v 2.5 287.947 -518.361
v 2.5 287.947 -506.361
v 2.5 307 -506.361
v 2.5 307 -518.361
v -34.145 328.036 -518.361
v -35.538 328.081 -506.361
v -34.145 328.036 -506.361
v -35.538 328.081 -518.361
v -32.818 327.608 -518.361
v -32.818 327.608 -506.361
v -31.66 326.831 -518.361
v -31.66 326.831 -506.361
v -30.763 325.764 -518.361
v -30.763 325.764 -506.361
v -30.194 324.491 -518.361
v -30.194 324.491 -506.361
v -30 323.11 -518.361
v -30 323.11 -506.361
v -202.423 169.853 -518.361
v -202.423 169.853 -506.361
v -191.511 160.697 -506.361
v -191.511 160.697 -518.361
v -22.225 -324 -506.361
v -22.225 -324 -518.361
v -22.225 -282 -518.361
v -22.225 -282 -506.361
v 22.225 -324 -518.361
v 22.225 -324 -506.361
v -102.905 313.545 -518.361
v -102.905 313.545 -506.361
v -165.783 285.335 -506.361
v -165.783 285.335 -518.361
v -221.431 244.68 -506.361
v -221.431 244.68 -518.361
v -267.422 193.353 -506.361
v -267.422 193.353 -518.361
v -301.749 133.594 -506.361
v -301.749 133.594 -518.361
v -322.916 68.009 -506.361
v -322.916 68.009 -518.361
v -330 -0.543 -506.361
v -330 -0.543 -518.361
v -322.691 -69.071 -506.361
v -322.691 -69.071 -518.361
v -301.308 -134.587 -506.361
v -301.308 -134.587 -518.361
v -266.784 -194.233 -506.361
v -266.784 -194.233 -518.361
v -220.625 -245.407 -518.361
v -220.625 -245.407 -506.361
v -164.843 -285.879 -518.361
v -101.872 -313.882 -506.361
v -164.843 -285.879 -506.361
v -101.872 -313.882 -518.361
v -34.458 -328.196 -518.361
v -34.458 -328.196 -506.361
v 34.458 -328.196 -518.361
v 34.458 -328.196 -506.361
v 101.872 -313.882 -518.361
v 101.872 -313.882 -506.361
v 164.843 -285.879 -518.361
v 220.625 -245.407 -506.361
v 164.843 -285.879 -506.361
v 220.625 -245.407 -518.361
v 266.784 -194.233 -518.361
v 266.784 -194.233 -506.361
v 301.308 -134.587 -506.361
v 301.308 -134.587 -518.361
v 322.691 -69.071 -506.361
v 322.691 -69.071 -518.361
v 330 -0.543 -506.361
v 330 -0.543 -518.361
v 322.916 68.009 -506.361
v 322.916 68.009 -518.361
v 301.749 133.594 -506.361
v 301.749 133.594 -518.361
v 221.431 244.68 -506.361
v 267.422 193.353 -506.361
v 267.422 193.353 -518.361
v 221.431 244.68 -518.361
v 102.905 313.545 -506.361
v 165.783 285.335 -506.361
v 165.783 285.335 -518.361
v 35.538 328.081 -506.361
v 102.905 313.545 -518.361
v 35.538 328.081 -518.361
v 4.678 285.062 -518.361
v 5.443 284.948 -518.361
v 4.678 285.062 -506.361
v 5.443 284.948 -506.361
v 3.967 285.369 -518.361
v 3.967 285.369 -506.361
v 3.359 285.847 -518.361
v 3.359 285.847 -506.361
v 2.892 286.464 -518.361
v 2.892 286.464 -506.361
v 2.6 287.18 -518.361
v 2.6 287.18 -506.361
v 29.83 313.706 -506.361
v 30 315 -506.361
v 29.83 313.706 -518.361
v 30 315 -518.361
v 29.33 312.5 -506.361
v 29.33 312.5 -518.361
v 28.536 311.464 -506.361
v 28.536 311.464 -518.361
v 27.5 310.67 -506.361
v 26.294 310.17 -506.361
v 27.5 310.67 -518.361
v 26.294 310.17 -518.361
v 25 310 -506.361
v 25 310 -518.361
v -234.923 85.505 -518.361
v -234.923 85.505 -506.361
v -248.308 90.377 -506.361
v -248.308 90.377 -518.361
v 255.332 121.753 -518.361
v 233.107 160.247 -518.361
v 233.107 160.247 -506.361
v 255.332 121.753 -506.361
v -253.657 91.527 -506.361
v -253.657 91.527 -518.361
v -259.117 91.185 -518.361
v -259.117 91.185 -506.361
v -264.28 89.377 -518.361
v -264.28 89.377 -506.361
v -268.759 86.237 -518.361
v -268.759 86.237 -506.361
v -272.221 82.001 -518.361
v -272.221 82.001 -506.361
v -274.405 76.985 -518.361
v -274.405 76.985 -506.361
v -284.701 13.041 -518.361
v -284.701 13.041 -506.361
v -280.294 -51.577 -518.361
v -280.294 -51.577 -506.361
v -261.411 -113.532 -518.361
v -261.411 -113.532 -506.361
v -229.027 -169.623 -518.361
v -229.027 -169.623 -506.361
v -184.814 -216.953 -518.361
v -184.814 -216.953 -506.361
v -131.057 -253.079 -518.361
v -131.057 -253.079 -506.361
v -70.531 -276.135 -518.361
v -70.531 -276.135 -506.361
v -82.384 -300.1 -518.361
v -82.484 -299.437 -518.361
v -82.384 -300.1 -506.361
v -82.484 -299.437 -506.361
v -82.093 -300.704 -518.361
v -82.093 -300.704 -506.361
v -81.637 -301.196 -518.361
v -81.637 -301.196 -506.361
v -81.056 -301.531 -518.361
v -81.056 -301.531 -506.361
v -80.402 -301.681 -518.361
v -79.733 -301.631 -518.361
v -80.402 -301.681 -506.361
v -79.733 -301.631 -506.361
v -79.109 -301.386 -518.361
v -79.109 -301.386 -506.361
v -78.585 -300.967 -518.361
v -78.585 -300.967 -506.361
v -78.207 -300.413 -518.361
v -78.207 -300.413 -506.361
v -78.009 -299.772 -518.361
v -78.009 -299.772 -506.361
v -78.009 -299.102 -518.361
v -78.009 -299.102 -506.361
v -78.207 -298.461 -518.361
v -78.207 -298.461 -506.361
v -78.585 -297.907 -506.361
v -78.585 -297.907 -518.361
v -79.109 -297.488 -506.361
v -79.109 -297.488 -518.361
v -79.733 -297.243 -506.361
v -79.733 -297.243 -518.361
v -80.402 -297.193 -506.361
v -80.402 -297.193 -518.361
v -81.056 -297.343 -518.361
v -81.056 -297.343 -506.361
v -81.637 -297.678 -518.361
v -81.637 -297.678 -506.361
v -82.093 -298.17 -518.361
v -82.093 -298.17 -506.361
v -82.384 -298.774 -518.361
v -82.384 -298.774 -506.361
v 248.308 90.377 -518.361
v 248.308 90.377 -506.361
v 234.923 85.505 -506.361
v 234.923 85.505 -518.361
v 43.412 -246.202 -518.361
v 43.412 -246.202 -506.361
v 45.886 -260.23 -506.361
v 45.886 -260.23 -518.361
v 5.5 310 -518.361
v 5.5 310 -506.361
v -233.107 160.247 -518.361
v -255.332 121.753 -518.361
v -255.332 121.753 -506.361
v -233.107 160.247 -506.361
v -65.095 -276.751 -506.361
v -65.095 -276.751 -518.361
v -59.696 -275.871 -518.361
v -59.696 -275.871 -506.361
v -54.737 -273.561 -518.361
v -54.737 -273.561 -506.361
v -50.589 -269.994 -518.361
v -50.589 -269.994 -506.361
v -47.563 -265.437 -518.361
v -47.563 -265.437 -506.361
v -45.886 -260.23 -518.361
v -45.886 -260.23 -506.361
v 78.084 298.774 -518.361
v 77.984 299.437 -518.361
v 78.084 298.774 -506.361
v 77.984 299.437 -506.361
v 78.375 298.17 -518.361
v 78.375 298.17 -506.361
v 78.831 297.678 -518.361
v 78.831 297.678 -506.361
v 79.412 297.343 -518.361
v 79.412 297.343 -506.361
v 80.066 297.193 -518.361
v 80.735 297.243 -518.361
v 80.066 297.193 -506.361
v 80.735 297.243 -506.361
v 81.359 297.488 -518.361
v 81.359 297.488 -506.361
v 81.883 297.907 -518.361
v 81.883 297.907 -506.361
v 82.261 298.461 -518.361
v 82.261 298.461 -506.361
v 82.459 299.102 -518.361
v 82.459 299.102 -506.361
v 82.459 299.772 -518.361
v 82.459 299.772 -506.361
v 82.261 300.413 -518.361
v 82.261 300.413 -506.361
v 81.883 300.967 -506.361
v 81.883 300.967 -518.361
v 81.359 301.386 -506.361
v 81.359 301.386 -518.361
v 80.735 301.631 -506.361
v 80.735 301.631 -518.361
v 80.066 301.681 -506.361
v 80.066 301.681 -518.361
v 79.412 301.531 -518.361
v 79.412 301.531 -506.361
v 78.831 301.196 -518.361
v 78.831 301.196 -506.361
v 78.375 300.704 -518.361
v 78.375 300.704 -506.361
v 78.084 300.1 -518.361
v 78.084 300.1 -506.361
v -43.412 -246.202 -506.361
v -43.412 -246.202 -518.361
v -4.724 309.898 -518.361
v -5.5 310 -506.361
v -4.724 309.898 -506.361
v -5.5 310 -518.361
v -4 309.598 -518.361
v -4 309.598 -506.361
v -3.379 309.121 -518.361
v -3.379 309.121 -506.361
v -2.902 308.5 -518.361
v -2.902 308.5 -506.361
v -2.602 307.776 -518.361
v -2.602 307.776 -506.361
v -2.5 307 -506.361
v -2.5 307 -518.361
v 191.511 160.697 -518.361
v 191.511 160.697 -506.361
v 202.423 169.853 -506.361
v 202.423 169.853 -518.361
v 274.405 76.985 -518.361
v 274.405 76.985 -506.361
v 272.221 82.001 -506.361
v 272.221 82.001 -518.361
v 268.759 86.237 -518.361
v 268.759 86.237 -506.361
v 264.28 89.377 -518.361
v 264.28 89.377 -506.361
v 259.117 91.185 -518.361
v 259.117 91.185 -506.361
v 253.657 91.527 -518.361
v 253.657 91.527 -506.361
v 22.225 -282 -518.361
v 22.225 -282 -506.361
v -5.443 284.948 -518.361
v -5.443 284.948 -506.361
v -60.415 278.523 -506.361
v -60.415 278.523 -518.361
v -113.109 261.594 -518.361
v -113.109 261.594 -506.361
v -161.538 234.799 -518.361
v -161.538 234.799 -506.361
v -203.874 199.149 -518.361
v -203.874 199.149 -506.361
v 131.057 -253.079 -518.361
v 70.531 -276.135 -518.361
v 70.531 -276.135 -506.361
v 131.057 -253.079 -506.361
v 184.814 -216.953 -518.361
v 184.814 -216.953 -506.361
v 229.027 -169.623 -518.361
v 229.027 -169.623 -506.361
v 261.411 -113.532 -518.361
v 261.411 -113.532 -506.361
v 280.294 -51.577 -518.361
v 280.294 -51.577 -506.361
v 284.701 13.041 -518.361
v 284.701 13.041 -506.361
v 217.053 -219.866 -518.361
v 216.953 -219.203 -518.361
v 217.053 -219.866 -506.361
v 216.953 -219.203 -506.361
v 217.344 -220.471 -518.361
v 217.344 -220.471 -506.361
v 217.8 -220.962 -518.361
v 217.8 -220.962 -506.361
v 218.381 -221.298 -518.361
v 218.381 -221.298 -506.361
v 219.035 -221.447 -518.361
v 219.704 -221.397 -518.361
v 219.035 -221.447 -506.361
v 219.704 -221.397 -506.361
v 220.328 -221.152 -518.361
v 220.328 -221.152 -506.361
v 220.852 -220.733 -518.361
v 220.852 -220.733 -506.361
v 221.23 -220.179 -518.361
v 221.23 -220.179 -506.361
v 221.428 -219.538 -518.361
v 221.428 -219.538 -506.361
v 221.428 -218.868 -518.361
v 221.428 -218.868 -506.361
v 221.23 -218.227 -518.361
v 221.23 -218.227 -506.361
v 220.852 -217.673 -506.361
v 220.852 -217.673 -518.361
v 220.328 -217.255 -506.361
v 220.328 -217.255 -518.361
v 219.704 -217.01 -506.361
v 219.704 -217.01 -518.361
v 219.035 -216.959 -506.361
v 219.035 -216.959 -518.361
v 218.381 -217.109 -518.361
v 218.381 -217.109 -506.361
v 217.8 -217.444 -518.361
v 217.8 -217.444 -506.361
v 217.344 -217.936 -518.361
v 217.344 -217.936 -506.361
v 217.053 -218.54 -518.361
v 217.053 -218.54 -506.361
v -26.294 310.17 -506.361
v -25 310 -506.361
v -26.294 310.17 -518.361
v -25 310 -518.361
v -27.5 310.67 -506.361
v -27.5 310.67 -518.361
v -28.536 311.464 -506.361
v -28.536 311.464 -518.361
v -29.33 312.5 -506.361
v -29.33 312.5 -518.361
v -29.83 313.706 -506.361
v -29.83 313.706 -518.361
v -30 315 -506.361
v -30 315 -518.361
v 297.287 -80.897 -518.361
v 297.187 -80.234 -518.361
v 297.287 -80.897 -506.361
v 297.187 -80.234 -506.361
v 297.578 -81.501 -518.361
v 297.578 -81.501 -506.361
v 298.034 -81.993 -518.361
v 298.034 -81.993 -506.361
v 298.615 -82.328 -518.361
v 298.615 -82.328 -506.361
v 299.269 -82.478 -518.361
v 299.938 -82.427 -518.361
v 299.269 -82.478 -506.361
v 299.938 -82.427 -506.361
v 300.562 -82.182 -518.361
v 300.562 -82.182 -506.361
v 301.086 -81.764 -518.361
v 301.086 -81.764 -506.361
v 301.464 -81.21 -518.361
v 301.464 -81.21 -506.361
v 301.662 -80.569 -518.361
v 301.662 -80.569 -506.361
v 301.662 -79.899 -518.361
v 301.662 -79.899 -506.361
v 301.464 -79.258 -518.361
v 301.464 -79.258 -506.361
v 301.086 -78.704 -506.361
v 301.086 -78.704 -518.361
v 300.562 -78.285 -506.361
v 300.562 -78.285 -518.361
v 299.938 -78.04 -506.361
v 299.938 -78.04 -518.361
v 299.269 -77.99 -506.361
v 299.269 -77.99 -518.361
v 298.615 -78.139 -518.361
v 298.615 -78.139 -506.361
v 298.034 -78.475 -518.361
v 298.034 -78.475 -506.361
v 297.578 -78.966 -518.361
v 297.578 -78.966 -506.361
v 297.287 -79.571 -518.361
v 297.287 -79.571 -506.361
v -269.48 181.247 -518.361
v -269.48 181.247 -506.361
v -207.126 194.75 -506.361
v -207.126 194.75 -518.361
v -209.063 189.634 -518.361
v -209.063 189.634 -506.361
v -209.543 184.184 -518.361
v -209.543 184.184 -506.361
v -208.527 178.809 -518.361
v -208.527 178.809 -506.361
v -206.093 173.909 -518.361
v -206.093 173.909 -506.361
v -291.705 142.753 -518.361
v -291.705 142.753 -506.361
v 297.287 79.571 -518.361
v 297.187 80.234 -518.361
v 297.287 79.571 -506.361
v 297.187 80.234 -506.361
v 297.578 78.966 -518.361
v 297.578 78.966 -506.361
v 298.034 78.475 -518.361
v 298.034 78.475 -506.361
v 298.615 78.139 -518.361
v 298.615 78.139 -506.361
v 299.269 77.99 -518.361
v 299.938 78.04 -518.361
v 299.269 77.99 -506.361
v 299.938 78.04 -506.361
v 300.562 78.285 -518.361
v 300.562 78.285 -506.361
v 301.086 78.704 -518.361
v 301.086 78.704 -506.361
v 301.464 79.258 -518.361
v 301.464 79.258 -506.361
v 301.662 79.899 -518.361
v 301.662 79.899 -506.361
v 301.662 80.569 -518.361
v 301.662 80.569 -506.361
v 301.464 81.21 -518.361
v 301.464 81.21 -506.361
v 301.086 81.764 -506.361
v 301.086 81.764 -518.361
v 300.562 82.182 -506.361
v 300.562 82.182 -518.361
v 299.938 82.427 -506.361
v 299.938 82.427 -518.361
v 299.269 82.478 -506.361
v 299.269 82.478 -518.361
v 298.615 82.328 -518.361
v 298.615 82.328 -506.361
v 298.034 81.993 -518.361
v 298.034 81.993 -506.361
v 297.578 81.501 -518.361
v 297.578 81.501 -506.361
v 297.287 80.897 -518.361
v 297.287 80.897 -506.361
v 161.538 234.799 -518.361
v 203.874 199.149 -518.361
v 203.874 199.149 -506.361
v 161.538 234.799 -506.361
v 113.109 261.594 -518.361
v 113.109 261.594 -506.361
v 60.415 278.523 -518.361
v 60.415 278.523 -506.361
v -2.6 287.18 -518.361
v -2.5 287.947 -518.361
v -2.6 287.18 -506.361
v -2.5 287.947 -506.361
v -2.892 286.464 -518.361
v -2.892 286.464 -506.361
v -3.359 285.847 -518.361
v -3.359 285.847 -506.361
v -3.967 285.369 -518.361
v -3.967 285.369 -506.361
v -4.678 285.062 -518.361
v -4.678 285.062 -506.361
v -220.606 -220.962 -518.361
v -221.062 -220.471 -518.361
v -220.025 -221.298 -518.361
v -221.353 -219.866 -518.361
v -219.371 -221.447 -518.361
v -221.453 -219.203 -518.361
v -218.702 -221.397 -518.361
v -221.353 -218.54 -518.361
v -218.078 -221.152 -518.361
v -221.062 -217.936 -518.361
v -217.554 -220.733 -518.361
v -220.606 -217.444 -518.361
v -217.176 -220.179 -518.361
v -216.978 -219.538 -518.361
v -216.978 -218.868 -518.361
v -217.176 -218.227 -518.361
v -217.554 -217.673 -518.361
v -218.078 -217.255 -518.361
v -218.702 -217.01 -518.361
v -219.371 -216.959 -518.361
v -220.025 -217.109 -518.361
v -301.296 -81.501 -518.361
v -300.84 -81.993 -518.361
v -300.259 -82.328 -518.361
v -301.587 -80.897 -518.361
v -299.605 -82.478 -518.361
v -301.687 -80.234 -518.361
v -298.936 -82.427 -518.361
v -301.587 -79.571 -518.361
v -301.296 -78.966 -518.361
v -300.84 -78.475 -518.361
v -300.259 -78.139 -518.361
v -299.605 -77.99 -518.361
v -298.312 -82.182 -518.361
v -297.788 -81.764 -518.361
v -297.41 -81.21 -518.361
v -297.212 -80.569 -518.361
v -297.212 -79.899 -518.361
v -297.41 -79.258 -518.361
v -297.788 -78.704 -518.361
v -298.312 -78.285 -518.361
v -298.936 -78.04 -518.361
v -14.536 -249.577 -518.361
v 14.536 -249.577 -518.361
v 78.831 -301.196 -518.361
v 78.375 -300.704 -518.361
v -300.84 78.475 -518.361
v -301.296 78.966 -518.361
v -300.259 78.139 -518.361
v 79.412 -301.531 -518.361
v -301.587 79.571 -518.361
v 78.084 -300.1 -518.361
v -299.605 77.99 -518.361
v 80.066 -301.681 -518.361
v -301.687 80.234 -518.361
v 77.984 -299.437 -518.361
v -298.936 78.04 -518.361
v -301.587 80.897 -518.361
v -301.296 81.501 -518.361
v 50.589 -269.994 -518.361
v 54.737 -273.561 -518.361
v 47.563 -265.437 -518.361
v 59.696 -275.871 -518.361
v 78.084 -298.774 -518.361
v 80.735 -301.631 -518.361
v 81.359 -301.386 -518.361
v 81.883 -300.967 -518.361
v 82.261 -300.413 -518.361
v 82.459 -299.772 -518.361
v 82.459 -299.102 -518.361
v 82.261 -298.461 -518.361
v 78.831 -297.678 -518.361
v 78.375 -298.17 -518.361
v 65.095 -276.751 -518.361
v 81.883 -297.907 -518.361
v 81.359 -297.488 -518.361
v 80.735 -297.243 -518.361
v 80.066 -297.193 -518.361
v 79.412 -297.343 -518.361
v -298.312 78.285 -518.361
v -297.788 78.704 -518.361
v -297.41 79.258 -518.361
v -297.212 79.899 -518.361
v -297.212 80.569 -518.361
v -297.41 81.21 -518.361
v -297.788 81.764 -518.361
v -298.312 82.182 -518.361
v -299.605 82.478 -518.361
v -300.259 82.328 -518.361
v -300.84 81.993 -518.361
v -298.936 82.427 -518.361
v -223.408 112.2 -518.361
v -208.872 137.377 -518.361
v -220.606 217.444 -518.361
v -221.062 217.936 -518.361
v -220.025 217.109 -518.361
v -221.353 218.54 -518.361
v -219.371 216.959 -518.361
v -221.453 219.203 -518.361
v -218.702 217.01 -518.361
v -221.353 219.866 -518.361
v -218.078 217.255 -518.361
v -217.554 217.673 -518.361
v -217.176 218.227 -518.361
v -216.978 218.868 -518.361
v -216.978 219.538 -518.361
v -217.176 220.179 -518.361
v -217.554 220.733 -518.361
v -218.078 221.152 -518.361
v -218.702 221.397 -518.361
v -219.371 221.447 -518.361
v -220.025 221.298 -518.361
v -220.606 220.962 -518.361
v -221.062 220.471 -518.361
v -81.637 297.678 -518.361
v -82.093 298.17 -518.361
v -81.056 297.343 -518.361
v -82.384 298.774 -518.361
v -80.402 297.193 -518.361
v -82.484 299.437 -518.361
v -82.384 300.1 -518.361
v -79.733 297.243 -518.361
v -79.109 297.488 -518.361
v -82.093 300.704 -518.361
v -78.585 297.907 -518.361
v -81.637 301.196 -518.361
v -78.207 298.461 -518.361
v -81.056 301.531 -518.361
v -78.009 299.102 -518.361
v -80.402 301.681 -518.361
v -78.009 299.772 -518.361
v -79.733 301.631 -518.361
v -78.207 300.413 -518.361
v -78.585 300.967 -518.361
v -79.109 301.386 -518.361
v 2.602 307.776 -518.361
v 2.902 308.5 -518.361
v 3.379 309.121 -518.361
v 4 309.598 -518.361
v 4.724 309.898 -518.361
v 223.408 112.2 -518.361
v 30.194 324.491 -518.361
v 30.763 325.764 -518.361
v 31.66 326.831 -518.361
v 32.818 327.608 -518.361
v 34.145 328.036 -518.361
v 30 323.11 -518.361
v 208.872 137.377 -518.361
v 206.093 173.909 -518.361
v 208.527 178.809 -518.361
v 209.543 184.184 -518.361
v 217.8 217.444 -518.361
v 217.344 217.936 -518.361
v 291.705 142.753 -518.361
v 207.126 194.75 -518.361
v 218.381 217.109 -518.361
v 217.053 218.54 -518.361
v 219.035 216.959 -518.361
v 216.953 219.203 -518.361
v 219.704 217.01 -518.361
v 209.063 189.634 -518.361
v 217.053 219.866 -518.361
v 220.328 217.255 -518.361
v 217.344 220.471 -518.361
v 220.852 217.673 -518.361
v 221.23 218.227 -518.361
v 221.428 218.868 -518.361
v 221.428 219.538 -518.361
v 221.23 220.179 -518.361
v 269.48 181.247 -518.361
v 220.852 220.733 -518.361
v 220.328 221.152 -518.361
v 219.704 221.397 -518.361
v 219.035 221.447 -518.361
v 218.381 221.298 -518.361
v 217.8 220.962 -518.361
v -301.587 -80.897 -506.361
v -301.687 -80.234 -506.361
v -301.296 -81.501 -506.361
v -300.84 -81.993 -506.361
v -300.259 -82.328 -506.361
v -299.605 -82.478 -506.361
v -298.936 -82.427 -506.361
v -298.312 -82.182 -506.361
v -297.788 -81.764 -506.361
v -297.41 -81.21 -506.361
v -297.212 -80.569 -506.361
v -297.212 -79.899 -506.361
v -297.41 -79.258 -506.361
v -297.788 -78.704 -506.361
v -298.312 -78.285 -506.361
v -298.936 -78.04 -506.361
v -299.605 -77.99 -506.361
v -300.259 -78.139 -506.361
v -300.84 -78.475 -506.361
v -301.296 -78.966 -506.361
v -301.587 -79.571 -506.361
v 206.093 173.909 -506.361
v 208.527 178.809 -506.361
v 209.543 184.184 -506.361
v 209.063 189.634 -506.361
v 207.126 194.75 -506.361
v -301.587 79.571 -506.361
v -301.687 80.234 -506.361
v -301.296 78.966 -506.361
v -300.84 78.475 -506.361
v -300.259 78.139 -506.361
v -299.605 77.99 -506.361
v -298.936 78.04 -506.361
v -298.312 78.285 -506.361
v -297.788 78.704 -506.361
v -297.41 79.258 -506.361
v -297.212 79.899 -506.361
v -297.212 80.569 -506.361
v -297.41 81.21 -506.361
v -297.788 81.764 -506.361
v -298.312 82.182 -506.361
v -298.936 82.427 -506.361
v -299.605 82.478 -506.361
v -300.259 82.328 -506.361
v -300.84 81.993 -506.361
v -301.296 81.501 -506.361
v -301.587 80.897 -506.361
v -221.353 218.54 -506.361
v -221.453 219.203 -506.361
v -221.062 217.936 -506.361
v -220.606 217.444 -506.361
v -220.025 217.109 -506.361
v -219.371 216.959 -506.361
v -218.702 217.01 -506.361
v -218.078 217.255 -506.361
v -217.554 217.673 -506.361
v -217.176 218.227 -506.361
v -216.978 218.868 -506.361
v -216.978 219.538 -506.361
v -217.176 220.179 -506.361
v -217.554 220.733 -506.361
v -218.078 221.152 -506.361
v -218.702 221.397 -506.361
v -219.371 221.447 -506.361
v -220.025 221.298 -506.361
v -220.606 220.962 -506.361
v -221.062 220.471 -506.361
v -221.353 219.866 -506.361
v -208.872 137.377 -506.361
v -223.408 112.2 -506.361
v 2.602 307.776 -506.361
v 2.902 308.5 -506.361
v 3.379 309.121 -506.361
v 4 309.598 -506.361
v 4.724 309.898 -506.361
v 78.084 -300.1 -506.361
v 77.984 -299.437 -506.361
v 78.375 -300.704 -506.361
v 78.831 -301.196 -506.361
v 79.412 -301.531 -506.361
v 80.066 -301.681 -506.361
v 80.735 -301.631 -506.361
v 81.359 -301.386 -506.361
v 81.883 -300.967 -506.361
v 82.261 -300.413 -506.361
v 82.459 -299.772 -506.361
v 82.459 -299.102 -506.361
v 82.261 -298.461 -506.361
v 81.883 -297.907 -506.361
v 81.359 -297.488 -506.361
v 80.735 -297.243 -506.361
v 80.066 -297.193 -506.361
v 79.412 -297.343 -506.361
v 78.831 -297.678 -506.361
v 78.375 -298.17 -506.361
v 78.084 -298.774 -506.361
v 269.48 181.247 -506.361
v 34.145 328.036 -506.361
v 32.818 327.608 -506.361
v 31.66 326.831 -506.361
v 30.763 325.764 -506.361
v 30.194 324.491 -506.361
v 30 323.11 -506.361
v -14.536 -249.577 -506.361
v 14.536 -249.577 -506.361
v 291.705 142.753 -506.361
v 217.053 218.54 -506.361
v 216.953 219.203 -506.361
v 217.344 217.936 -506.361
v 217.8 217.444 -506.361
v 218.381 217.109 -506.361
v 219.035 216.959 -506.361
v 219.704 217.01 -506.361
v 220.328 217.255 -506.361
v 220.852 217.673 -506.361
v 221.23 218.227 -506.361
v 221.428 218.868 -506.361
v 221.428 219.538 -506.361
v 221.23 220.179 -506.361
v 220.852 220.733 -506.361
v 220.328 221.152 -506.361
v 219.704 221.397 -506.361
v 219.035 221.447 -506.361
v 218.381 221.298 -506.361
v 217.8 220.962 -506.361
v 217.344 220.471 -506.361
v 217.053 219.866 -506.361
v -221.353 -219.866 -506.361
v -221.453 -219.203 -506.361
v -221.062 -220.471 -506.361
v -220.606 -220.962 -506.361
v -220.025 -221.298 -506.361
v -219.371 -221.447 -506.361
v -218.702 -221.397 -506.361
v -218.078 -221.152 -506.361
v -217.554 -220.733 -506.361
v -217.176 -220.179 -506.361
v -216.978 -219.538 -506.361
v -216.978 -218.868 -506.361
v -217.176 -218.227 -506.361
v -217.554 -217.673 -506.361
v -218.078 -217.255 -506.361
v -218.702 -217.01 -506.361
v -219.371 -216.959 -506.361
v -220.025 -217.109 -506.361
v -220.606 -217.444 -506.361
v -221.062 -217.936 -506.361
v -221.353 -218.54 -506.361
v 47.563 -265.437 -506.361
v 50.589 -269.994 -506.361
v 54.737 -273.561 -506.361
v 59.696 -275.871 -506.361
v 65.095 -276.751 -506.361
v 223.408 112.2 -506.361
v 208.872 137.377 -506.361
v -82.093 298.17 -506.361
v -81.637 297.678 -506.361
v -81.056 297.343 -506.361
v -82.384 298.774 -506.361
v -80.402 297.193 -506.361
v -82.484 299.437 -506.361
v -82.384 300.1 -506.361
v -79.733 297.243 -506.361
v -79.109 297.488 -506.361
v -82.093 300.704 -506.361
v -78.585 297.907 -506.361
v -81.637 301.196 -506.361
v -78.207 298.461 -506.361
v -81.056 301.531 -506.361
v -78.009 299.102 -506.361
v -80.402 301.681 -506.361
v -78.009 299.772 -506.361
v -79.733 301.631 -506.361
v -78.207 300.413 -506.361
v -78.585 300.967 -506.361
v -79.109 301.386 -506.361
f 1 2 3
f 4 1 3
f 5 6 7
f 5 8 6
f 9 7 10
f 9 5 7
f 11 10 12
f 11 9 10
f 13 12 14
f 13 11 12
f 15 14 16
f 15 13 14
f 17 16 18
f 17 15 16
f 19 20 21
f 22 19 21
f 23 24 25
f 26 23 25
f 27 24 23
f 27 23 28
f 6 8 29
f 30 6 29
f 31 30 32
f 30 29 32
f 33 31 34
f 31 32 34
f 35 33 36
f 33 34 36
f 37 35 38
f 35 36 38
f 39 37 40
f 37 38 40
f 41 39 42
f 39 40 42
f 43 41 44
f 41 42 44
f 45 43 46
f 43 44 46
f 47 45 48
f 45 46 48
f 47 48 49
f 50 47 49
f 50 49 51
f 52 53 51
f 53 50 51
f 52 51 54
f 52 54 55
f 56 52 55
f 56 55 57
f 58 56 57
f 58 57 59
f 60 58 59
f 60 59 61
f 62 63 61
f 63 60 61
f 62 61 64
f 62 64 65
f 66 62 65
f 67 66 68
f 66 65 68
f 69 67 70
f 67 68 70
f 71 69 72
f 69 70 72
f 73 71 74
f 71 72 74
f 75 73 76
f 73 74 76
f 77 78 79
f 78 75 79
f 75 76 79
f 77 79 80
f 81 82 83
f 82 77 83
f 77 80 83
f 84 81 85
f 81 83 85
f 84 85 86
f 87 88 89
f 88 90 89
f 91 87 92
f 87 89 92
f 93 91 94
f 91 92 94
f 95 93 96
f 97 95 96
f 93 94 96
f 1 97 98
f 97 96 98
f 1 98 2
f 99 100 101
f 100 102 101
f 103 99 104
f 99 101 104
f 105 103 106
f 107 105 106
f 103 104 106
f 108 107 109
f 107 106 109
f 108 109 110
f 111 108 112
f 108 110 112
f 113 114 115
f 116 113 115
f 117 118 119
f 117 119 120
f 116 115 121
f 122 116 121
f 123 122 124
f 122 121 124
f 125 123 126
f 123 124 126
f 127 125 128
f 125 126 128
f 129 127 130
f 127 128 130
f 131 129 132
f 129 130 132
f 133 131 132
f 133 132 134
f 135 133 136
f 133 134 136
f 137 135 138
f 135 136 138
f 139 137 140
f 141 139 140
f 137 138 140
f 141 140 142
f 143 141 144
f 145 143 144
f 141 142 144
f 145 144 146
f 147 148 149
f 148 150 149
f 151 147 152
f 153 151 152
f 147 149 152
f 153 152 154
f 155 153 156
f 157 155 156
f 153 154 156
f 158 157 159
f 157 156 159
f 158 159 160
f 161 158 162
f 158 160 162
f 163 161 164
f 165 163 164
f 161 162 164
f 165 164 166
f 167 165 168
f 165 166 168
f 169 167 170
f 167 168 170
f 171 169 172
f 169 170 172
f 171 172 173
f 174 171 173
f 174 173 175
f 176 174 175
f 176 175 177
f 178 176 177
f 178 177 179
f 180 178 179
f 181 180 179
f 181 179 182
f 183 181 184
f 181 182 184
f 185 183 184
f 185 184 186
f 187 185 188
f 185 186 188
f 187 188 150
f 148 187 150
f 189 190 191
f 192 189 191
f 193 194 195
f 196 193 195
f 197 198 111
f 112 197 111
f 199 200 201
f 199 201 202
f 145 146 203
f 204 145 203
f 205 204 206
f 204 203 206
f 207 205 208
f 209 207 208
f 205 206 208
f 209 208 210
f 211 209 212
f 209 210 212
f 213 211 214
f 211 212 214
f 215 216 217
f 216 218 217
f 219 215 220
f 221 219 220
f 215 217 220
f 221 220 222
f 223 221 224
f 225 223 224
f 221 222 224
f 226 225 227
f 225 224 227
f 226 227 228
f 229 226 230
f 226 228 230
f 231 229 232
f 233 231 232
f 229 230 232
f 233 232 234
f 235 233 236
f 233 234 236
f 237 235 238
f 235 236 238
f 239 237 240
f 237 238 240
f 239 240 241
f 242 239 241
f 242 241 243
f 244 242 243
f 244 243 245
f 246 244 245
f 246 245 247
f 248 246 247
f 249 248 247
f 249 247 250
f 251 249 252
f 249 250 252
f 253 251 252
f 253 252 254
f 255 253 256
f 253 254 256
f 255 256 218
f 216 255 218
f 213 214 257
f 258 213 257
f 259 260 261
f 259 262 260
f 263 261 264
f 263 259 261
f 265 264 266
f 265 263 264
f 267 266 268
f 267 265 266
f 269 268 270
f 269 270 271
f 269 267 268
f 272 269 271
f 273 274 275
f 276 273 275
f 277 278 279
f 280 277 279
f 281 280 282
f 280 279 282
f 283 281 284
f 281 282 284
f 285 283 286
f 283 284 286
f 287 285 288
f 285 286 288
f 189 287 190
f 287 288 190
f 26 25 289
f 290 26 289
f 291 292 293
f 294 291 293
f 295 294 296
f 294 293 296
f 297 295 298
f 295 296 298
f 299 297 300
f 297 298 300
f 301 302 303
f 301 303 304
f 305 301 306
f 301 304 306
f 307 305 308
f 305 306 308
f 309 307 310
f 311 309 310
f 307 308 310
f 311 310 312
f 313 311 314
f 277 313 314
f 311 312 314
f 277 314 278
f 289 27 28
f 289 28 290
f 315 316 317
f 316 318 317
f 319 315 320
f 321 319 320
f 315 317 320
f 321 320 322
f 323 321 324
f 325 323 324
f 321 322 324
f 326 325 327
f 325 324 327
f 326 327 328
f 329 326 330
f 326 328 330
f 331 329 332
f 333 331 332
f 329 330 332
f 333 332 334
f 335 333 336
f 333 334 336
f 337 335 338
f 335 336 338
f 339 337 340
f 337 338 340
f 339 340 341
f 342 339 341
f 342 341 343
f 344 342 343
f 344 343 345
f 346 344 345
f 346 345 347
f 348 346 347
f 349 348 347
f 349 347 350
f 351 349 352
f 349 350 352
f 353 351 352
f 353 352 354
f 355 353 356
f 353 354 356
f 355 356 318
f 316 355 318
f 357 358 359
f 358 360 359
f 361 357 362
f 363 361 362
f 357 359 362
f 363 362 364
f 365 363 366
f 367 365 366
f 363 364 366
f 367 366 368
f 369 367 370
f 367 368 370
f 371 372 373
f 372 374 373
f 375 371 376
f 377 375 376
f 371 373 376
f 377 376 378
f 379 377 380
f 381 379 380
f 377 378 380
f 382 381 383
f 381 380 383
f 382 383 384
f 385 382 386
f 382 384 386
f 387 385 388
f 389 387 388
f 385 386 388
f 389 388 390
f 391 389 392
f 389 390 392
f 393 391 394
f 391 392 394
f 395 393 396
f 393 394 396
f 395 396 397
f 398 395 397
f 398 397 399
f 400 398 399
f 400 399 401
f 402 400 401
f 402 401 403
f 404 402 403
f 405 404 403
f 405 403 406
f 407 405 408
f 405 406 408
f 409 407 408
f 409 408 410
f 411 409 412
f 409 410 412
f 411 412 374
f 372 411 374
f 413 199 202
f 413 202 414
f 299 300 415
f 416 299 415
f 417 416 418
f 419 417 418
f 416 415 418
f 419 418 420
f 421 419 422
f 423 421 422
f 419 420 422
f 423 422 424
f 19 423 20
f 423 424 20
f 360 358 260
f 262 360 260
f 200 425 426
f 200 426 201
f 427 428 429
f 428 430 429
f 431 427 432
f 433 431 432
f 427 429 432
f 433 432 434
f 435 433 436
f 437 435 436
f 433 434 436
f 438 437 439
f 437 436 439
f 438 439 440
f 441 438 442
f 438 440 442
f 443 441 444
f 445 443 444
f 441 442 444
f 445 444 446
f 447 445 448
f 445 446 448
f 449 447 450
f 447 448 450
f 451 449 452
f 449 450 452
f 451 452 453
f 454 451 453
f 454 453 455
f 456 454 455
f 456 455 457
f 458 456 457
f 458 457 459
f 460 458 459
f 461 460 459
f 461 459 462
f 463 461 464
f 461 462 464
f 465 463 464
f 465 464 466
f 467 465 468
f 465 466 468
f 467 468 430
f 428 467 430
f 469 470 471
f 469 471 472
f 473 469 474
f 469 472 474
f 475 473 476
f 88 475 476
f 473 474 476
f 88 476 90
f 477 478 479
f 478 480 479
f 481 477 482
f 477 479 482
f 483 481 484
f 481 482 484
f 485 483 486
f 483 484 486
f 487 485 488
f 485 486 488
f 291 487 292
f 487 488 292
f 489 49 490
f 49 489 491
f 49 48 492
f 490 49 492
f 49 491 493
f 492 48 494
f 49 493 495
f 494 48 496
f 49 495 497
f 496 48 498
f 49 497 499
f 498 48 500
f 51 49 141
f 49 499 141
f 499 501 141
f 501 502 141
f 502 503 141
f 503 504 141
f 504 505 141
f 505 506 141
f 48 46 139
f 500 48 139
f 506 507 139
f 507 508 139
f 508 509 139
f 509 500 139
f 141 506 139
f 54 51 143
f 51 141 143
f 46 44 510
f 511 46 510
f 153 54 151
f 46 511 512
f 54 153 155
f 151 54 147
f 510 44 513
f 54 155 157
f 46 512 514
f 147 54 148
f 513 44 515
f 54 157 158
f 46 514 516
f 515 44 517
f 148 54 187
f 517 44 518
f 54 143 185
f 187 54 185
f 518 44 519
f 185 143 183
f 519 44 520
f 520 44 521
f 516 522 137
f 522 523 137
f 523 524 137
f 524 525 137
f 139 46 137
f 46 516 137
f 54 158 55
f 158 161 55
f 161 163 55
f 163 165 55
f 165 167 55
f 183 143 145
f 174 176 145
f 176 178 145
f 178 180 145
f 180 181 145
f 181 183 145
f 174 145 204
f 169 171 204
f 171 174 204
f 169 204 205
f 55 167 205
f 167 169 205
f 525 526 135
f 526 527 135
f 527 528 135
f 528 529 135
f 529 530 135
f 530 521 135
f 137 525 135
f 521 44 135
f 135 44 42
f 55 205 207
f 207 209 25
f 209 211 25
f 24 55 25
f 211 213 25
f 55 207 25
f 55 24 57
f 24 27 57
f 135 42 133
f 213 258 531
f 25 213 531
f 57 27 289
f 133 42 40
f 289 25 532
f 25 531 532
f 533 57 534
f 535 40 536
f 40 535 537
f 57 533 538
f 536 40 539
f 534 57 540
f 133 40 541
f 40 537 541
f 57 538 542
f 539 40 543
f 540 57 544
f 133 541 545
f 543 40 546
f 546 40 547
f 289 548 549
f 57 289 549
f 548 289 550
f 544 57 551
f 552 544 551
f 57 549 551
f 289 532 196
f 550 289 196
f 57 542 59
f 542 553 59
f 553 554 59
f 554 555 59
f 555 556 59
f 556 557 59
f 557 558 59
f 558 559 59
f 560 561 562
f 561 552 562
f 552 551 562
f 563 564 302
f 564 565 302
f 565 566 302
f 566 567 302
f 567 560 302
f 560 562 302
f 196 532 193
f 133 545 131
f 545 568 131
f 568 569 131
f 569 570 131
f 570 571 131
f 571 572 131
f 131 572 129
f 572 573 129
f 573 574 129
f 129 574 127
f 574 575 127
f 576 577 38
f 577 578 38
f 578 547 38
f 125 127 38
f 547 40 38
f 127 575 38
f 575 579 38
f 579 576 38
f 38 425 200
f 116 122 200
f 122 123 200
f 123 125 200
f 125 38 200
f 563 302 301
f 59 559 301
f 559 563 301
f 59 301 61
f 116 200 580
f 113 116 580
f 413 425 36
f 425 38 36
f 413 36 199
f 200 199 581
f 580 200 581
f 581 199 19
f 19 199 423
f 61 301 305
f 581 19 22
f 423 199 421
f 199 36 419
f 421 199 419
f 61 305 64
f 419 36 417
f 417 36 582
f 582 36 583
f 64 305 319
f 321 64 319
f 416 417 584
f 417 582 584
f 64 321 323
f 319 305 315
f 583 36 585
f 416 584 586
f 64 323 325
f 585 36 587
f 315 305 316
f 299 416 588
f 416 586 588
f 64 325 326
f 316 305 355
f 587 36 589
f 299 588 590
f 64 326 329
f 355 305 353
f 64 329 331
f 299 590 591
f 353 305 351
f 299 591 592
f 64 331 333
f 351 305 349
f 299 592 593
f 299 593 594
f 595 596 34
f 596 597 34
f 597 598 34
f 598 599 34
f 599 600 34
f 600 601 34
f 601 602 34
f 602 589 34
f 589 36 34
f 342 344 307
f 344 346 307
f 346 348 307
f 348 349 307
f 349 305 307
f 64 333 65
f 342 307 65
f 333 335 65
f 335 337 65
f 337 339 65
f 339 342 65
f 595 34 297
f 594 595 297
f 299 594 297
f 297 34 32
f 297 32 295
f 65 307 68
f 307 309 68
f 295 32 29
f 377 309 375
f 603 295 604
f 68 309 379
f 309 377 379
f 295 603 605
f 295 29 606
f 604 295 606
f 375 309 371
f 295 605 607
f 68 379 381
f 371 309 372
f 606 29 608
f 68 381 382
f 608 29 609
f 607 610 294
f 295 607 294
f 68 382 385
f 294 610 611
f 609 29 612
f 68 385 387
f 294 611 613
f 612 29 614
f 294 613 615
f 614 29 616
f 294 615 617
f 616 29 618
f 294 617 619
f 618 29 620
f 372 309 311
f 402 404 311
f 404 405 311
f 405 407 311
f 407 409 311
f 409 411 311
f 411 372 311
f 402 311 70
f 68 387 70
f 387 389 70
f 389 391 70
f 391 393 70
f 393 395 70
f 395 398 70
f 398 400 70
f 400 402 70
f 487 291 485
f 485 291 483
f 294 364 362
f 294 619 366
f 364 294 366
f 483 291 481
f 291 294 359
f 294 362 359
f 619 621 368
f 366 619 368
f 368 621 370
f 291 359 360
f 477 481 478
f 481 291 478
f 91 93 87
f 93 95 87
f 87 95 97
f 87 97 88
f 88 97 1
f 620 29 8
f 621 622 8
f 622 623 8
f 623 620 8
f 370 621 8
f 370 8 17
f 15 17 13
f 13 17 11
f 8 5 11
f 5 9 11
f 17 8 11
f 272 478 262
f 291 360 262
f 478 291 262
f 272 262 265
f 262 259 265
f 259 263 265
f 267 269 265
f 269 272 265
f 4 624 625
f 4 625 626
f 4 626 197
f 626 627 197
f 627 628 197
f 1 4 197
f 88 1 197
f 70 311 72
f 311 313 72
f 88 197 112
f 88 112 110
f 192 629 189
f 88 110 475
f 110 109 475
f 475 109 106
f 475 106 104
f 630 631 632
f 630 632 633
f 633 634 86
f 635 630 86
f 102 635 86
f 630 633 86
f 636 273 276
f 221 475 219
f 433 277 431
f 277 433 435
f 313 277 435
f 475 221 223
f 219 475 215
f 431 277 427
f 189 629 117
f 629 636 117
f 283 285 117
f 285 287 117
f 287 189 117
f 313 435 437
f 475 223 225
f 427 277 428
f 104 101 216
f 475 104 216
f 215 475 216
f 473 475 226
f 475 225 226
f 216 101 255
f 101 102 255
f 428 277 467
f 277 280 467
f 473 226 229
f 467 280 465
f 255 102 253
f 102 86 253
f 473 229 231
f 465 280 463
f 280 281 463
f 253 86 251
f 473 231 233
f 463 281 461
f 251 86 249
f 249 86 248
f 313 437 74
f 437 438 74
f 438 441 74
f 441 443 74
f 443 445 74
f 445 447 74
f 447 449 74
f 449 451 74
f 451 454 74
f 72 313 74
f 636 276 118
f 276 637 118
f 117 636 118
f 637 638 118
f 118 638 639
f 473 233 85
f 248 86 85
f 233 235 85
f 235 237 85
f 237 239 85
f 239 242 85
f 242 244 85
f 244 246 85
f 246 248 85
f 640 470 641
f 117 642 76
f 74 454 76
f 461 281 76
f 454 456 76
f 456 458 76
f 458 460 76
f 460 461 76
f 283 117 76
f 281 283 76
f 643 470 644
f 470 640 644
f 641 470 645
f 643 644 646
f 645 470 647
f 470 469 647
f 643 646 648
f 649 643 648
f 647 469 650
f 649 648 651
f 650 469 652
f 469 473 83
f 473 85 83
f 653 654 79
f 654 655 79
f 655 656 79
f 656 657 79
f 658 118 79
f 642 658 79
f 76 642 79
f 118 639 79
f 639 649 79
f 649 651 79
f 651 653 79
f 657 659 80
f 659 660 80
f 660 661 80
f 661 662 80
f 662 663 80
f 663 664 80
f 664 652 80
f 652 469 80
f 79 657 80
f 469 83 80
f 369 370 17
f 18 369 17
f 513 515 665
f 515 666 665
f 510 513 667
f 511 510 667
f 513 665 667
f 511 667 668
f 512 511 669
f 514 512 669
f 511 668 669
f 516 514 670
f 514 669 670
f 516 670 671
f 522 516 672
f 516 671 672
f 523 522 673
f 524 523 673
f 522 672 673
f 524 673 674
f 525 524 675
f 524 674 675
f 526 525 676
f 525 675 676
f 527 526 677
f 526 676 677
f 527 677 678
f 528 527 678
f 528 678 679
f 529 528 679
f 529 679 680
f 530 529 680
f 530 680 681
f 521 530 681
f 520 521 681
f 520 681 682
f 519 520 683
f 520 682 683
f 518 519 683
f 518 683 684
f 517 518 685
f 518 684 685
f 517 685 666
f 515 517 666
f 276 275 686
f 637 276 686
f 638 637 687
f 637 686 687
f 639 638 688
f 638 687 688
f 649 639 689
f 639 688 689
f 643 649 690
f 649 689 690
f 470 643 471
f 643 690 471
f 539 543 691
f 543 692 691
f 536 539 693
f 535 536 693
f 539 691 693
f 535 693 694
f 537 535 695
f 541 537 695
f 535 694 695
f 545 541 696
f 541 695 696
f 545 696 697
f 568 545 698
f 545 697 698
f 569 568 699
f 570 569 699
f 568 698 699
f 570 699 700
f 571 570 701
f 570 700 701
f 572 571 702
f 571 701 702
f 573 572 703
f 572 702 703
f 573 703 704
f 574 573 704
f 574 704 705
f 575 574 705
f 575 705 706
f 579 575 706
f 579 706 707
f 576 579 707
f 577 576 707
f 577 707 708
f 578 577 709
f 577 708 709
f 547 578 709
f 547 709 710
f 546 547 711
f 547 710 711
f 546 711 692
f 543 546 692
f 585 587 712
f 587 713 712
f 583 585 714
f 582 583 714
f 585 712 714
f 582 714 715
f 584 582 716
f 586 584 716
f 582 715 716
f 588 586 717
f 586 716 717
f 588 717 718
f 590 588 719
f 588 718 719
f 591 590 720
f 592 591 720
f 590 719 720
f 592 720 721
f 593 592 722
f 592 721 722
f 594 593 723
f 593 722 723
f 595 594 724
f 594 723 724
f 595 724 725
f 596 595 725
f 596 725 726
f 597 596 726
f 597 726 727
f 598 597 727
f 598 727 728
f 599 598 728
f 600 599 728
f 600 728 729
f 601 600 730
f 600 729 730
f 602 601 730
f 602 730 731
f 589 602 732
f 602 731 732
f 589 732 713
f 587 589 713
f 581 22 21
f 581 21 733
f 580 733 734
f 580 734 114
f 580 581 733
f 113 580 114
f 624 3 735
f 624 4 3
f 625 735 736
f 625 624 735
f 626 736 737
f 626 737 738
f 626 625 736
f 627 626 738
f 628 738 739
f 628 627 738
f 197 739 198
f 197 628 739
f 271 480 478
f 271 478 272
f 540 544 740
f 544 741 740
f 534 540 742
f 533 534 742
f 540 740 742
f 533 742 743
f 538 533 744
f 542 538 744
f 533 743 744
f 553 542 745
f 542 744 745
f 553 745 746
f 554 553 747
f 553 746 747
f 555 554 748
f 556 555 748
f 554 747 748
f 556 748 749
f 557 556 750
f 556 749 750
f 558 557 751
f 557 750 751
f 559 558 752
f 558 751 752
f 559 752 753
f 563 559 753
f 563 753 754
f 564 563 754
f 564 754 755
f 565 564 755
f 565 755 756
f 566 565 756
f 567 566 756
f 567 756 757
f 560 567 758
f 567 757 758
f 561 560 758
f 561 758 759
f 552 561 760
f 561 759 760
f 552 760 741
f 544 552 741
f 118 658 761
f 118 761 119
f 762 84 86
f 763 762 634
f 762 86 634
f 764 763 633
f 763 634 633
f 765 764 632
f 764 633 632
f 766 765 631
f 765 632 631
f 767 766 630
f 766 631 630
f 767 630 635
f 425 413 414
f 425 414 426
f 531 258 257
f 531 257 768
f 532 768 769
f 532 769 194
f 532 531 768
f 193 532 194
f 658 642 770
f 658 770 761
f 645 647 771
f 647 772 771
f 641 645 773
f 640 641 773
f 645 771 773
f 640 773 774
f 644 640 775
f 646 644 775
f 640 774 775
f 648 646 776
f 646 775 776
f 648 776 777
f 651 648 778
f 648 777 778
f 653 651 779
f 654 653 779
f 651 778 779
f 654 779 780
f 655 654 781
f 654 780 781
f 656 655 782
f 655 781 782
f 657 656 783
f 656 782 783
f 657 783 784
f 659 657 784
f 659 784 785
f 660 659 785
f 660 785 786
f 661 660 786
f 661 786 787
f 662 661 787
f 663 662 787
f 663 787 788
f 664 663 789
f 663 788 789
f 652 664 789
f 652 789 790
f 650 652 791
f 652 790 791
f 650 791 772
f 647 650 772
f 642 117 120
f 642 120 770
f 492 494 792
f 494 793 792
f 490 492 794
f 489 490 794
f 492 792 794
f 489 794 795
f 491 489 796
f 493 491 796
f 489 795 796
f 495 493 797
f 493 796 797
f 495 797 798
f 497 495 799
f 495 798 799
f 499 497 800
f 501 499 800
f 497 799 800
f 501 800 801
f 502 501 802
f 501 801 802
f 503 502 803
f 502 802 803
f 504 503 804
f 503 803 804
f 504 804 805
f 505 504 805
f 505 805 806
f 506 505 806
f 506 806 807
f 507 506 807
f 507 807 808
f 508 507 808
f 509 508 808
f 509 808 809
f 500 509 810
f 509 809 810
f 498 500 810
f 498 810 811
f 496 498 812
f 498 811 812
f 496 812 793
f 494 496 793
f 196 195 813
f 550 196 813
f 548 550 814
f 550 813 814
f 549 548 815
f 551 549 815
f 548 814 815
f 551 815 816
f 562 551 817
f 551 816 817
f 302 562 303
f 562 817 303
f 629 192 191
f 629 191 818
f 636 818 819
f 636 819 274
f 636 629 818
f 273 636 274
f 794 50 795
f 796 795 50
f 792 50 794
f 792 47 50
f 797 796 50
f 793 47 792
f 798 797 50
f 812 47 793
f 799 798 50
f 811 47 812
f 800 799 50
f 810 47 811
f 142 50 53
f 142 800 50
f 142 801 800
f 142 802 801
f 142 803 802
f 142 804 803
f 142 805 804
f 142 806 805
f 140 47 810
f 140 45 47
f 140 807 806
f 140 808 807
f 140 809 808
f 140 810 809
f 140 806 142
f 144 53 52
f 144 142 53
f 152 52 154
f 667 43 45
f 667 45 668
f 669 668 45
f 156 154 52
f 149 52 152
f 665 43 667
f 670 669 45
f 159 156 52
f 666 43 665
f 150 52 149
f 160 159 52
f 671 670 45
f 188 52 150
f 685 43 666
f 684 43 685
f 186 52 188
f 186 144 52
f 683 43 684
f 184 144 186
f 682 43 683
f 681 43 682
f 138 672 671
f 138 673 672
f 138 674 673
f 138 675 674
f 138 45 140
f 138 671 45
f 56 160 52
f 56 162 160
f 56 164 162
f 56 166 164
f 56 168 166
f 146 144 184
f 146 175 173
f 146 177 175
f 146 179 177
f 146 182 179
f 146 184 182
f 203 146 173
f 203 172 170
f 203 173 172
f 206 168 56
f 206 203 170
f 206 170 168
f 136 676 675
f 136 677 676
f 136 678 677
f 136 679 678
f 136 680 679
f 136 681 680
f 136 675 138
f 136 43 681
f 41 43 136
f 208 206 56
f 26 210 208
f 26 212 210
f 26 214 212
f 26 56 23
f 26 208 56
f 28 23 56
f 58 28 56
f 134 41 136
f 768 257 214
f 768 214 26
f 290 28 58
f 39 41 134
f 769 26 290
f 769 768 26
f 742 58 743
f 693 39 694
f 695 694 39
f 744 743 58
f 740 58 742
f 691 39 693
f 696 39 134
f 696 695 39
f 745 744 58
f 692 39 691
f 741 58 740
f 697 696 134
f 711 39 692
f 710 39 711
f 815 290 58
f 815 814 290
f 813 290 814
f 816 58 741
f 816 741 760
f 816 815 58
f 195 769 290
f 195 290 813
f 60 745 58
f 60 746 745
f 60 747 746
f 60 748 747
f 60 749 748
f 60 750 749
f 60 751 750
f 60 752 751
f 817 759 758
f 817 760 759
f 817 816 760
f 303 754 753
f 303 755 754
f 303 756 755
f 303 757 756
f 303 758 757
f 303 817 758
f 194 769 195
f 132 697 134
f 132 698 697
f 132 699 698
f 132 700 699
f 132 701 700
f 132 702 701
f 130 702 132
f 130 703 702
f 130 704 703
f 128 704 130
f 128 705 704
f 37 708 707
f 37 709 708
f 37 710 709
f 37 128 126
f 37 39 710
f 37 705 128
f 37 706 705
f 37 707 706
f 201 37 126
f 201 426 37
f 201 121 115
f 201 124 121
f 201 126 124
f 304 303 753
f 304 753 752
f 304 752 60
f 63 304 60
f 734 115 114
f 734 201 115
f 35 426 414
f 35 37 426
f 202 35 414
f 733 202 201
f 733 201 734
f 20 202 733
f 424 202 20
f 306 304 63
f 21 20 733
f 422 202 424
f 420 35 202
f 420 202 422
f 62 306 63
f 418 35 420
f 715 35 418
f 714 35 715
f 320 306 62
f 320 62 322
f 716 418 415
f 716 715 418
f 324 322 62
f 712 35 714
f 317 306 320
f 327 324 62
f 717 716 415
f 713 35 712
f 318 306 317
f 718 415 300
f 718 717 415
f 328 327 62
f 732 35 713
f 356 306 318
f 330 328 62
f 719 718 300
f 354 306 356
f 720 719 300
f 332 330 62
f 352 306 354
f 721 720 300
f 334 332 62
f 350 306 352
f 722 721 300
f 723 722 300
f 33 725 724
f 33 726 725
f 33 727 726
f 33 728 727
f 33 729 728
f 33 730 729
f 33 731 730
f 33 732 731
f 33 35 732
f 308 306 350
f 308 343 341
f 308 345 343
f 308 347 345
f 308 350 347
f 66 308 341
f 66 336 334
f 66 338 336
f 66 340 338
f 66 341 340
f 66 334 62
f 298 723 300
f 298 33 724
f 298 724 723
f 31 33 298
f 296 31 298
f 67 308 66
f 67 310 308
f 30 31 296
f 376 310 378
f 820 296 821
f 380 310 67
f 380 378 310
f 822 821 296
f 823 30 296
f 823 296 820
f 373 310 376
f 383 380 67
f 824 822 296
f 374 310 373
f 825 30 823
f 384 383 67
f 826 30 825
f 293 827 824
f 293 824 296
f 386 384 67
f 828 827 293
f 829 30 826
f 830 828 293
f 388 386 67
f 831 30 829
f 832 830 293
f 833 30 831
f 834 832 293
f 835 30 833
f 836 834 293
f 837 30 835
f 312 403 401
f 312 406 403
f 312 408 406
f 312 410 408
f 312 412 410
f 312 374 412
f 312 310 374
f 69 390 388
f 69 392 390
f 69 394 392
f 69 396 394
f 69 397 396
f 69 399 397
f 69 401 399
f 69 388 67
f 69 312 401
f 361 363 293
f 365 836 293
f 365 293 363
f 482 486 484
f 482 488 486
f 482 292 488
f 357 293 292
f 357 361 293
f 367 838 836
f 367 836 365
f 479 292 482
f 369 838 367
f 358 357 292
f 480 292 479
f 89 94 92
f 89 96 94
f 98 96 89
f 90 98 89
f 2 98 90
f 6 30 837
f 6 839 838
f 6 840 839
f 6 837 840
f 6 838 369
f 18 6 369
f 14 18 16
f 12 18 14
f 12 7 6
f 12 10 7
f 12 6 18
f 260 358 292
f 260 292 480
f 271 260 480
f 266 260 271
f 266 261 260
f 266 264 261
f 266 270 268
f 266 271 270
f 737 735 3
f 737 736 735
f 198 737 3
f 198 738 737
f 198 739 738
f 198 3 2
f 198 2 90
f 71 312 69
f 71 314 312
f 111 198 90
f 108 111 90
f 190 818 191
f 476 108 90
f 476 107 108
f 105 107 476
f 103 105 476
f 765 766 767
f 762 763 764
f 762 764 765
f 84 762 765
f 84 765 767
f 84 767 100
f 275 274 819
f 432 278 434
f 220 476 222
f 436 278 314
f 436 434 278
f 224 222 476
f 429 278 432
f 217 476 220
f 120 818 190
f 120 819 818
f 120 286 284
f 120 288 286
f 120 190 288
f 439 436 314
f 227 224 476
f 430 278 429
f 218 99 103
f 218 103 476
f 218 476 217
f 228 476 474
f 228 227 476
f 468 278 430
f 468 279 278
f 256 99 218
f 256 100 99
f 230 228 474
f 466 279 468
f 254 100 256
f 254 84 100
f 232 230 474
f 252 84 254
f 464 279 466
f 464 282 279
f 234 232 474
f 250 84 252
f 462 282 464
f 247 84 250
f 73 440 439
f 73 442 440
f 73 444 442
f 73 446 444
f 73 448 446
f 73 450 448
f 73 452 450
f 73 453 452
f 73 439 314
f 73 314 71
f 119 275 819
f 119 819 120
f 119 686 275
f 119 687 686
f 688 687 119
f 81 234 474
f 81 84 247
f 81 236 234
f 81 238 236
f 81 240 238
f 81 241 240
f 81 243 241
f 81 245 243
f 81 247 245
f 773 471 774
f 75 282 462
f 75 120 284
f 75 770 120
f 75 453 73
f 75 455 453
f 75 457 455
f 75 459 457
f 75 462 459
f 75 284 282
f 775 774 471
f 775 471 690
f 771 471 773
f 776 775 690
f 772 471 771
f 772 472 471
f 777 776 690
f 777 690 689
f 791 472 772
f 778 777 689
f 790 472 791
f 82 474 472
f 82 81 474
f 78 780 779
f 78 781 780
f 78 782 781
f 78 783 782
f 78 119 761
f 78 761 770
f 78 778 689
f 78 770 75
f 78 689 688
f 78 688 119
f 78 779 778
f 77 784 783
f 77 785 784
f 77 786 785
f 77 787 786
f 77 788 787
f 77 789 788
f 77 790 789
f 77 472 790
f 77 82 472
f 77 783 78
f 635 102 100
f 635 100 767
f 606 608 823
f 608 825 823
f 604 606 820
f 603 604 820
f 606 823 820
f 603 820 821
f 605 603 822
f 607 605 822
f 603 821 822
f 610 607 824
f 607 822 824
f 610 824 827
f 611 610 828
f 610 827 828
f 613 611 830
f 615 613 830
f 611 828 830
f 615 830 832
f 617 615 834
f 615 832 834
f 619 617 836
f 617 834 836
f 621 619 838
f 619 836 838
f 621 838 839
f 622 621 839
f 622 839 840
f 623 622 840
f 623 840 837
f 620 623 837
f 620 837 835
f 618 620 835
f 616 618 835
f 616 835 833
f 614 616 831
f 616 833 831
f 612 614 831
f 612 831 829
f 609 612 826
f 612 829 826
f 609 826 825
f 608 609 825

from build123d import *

# Parameters (mm, degrees)
SKETCH2_R                                      = 330
SKETCH2_R_2                                    = 250
SKETCH2_W                                      = 44.45
SKETCH2_H                                      = 42
BOSS_EXTRUDE1_DEPTH                            = 12
CUT_EXTRUDE1_DEPTH                             = 12
SKETCH5_W                                      = 60
SKETCH5_H                                      = 60
CUT_EXTRUDE2_DEPTH                             = 12
FILLET1_R                                      = 5
SKETCH6_W                                      = 5
SKETCH6_H                                      = 30
CUT_EXTRUDE3_DEPTH                             = 12
FILLET2_R                                      = 3
CSK_FOR_M4_FLAT_HEAD_MACHINE_SCREW_D           = 4.5
CSK_FOR_M4_FLAT_HEAD_MACHINE_SCREW_CSINK_D     = 9.4
CSK_FOR_M4_FLAT_HEAD_MACHINE_SCREW_CSINK_ANGLE = 90


with BuildPart() as part:
    # Sketch2 → Boss-Extrude1 (new body)
    with BuildSketch(Plane.XY.offset(-518.360637908)):
        Circle(SKETCH2_R)
        Circle(SKETCH2_R_2, mode=Mode.SUBTRACT)
        with Locations((0, -303)):
            Rectangle(SKETCH2_W, SKETCH2_H, mode=Mode.SUBTRACT)
        Polygon((269.479730826, 181.247414599), (233.106663867, 160.247414599), (255.331663867, 121.752585401), (291.704730826, 142.752585401), align=None, mode=Mode.SUBTRACT)
        Polygon((-291.704730826, 142.752585401), (-255.331663867, 121.752585401), (-233.106663867, 160.247414599), (-269.479730826, 181.247414599), align=None, mode=Mode.SUBTRACT)
    extrude(amount=BOSS_EXTRUDE1_DEPTH)

    # Sketch3 → Cut-Extrude1 (cut)
    with BuildSketch(Plane.XY.offset(-506.360637908)):
        with BuildLine():
            Line((191.51111078, 160.696902422), (202.422805046, 169.852901056))
            ThreePointArc((202.422805046, 169.852901056), (209.542560602, 184.184300077), (203.874000238, 199.14917029))
            ThreePointArc((203.874000238, 199.14917029), (0, 285), (-203.874000238, 199.14917029))
            ThreePointArc((-203.874000238, 199.14917029), (-209.542560602, 184.184300077), (-202.422805046, 169.852901056))
            Line((-202.422805046, 169.852901056), (-191.51111078, 160.696902422))
            ThreePointArc((-191.51111078, 160.696902422), (0, 250), (191.51111078, 160.696902422))
        make_face()
        with BuildLine():
            Line((43.412044417, -246.201938253), (45.885524698, -260.229742003))
            ThreePointArc((45.885524698, -260.229742003), (54.737002544, -273.561330694), (70.531240495, -276.134648522))
            ThreePointArc((70.531240495, -276.134648522), (246.817240079, -142.5), (274.405240732, 76.985478232))
            ThreePointArc((274.405240732, 76.985478232), (264.279563146, 89.377030617), (248.308329744, 90.376840947))
            Line((248.308329744, 90.376840947), (234.923155196, 85.505035831))
            ThreePointArc((234.923155196, 85.505035831), (216.506350946, -125), (43.412044417, -246.201938253))
        make_face()
        with BuildLine():
            Line((-234.923155196, 85.505035831), (-248.308329744, 90.376840947))
            ThreePointArc((-248.308329744, 90.376840947), (-264.279563146, 89.377030617), (-274.405240732, 76.985478232))
            ThreePointArc((-274.405240732, 76.985478232), (-246.817240079, -142.5), (-70.531240495, -276.134648522))
            ThreePointArc((-70.531240495, -276.134648522), (-54.737002544, -273.561330694), (-45.885524698, -260.229742003))
            Line((-45.885524698, -260.229742003), (-43.412044417, -246.201938253))
            ThreePointArc((-43.412044417, -246.201938253), (-216.506350946, -125), (-234.923155196, 85.505035831))
        make_face()
    extrude(amount=-CUT_EXTRUDE1_DEPTH, mode=Mode.SUBTRACT)

    # Sketch5 → Cut-Extrude2 (cut)
    with BuildSketch(Plane.XY.offset(-506.360637908)):
        with Locations((0, 340)):
            Rectangle(SKETCH5_W, SKETCH5_H)
    extrude(amount=-CUT_EXTRUDE2_DEPTH, mode=Mode.SUBTRACT)

    # Fillet1
    fillet1_edges = [part.edges().sort_by_distance(p)[0] for p in [
        (30, 328.633534503, -512.360637908),
        (-30, 328.633534503, -512.360637908),
        (-30, 310, -512.360637908),
        (30, 310, -512.360637908),
    ]]
    fillet(fillet1_edges, radius=FILLET1_R)

    # Sketch6 → Cut-Extrude3 (cut)
    with BuildSketch(Plane.XY.offset(-506.360637908)):
        with Locations((0, 295)):
            Rectangle(SKETCH6_W, SKETCH6_H)
    extrude(amount=-CUT_EXTRUDE3_DEPTH, mode=Mode.SUBTRACT)

    # Fillet2
    fillet2_edges = [part.edges().sort_by_distance(p)[0] for p in [
        (2.5, 284.989034877, -512.360637908),
        (2.5, 310, -512.360637908),
        (-2.5, 284.989034877, -512.360637908),
        (-2.5, 310, -512.360637908),
    ]]
    fillet(fillet2_edges, radius=FILLET2_R)

    # CSK for M4 Flat Head Machine Screw (through all)
    with Locations(Plane(origin=(0, 0, -530.360637908), x_dir=(1, 0, 0), z_dir=(0, 0, -1))):
        with Locations((80.233903982, 299.43700615), (219.203102168, 219.203102168), (299.43700615, 80.233903982), (299.43700615, -80.233903982), (219.203102168, -219.203102168), (80.233903982, -299.43700615), (-80.233903982, -299.43700615), (-219.203102168, -219.203102168), (-299.43700615, -80.233903982), (-299.43700615, 80.233903982), (-219.203102168, 219.203102168), (-80.233903982, 299.43700615), (0, 0)):
            CounterSinkHole(CSK_FOR_M4_FLAT_HEAD_MACHINE_SCREW_D / 2, CSK_FOR_M4_FLAT_HEAD_MACHINE_SCREW_CSINK_D / 2, counter_sink_angle=CSK_FOR_M4_FLAT_HEAD_MACHINE_SCREW_CSINK_ANGLE)


solid = part.part
